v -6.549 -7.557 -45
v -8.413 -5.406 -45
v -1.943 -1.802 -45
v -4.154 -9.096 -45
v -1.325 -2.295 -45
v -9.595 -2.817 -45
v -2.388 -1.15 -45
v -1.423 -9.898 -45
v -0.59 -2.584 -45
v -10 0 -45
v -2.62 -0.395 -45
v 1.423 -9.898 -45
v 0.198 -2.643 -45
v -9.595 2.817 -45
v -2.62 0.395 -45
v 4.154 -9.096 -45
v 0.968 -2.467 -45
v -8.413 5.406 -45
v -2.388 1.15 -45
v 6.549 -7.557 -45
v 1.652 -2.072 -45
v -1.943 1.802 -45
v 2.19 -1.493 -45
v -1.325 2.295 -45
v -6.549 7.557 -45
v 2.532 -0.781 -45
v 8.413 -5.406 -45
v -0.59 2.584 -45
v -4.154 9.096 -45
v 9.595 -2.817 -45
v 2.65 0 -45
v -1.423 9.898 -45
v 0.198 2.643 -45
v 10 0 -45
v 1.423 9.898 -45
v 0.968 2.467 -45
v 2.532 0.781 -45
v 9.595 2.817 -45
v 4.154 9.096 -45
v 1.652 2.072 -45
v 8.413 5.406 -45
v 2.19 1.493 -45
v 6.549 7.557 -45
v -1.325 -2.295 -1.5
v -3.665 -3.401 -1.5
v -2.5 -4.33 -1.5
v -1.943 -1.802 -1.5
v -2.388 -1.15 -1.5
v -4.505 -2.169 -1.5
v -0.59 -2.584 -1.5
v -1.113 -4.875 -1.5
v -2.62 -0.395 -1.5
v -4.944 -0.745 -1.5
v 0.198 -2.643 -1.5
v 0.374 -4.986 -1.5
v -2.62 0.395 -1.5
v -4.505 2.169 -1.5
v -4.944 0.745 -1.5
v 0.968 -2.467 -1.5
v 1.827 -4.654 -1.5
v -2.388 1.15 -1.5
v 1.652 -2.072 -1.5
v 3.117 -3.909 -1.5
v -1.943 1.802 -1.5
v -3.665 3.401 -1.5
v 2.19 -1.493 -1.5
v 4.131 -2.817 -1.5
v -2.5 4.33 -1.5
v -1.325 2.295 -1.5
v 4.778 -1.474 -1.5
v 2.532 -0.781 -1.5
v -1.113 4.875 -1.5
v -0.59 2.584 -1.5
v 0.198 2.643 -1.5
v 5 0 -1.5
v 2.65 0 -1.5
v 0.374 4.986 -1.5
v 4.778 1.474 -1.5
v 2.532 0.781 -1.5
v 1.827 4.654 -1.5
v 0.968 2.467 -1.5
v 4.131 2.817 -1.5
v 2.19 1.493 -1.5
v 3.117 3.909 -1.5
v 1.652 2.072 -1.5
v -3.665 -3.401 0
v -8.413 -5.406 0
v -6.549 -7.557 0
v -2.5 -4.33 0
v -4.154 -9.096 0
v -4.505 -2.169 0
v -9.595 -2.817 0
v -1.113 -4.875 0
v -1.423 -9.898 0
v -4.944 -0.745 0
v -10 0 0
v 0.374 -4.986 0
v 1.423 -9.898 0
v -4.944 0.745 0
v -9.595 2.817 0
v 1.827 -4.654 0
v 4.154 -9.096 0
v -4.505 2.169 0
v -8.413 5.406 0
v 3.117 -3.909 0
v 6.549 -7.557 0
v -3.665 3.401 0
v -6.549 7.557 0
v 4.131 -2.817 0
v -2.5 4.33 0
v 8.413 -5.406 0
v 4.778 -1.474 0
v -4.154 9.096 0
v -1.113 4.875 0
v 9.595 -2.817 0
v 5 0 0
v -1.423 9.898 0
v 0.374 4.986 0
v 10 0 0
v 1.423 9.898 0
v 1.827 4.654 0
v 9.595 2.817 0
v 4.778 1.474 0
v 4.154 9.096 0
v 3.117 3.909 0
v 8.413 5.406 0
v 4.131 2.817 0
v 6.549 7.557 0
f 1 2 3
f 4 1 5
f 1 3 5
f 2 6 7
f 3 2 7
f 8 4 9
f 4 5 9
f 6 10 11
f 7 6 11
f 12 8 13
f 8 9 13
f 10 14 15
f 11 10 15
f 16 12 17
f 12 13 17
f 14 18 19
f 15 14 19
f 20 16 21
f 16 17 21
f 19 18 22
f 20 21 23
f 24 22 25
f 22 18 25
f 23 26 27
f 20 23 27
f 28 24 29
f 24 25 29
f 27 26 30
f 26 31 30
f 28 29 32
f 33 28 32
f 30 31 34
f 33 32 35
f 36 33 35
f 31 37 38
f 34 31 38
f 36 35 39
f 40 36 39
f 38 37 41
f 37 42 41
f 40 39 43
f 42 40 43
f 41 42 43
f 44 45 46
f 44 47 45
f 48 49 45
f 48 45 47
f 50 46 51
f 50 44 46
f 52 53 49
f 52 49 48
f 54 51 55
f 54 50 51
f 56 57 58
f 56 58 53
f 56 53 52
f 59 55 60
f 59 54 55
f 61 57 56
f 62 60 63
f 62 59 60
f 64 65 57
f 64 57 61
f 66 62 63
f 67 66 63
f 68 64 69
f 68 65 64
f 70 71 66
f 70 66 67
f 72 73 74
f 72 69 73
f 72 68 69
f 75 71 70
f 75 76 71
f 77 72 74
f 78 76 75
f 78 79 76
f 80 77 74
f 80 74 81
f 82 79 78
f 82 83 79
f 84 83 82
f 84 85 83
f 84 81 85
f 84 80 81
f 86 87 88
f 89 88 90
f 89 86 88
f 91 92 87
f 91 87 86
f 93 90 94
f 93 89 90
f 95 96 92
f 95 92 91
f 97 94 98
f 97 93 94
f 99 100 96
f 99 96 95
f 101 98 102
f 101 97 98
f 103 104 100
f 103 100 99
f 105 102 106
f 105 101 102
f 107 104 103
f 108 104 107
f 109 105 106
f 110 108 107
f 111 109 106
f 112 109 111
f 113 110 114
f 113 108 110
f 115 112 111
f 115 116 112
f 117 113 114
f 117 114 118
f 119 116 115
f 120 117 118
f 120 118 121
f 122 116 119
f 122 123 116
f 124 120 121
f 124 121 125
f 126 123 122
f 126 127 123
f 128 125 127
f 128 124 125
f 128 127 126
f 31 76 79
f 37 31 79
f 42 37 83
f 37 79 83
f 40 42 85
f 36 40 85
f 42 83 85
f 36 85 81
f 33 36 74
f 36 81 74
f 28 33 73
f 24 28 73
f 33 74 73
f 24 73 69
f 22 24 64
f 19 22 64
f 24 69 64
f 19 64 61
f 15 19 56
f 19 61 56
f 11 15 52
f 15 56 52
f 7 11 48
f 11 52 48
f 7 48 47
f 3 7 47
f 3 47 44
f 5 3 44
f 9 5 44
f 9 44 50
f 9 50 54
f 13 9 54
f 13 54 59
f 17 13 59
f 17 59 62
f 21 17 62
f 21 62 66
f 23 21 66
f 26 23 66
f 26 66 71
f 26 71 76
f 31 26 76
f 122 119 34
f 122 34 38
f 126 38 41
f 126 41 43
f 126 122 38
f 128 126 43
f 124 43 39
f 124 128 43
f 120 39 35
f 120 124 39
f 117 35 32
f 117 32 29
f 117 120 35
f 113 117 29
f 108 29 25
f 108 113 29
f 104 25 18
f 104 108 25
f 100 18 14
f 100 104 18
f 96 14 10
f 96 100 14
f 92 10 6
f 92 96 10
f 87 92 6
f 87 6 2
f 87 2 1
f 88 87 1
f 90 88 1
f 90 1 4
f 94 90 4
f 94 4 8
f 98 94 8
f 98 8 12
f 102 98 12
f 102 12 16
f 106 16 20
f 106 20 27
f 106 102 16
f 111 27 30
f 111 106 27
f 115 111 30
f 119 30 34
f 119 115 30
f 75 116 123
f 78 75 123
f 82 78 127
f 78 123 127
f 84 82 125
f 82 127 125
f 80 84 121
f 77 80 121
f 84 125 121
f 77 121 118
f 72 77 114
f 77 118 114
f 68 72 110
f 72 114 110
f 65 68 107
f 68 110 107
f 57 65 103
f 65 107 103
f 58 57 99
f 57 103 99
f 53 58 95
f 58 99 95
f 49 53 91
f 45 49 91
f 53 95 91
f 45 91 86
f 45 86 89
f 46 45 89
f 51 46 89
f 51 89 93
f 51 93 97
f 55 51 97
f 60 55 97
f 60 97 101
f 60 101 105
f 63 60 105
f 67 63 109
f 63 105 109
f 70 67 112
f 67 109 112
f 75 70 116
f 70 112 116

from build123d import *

# Parameters (mm, degrees)
SKETCH1_R           = 10
BOSS_EXTRUDE1_DEPTH = 45
SKETCH2_R           = 2.65
CUT_EXTRUDE1_DEPTH  = 48.16990566
SKETCH3_R           = 5
CUT_EXTRUDE2_DEPTH  = 1.5


with BuildPart() as part:
    # Sketch1 → Boss-Extrude1 (new body)
    with BuildSketch(Plane.XY):
        Circle(SKETCH1_R)
    extrude(amount=-BOSS_EXTRUDE1_DEPTH)

    # Sketch2 → Cut-Extrude1 (cut, through all)
    with BuildSketch(Plane.XY):
        Circle(SKETCH2_R)
    extrude(amount=-CUT_EXTRUDE1_DEPTH, mode=Mode.SUBTRACT)

    # Sketch3 → Cut-Extrude2 (cut)
    with BuildSketch(Plane.XY):
        Circle(SKETCH3_R)
    extrude(amount=-CUT_EXTRUDE2_DEPTH, mode=Mode.SUBTRACT)


solid = part.part
